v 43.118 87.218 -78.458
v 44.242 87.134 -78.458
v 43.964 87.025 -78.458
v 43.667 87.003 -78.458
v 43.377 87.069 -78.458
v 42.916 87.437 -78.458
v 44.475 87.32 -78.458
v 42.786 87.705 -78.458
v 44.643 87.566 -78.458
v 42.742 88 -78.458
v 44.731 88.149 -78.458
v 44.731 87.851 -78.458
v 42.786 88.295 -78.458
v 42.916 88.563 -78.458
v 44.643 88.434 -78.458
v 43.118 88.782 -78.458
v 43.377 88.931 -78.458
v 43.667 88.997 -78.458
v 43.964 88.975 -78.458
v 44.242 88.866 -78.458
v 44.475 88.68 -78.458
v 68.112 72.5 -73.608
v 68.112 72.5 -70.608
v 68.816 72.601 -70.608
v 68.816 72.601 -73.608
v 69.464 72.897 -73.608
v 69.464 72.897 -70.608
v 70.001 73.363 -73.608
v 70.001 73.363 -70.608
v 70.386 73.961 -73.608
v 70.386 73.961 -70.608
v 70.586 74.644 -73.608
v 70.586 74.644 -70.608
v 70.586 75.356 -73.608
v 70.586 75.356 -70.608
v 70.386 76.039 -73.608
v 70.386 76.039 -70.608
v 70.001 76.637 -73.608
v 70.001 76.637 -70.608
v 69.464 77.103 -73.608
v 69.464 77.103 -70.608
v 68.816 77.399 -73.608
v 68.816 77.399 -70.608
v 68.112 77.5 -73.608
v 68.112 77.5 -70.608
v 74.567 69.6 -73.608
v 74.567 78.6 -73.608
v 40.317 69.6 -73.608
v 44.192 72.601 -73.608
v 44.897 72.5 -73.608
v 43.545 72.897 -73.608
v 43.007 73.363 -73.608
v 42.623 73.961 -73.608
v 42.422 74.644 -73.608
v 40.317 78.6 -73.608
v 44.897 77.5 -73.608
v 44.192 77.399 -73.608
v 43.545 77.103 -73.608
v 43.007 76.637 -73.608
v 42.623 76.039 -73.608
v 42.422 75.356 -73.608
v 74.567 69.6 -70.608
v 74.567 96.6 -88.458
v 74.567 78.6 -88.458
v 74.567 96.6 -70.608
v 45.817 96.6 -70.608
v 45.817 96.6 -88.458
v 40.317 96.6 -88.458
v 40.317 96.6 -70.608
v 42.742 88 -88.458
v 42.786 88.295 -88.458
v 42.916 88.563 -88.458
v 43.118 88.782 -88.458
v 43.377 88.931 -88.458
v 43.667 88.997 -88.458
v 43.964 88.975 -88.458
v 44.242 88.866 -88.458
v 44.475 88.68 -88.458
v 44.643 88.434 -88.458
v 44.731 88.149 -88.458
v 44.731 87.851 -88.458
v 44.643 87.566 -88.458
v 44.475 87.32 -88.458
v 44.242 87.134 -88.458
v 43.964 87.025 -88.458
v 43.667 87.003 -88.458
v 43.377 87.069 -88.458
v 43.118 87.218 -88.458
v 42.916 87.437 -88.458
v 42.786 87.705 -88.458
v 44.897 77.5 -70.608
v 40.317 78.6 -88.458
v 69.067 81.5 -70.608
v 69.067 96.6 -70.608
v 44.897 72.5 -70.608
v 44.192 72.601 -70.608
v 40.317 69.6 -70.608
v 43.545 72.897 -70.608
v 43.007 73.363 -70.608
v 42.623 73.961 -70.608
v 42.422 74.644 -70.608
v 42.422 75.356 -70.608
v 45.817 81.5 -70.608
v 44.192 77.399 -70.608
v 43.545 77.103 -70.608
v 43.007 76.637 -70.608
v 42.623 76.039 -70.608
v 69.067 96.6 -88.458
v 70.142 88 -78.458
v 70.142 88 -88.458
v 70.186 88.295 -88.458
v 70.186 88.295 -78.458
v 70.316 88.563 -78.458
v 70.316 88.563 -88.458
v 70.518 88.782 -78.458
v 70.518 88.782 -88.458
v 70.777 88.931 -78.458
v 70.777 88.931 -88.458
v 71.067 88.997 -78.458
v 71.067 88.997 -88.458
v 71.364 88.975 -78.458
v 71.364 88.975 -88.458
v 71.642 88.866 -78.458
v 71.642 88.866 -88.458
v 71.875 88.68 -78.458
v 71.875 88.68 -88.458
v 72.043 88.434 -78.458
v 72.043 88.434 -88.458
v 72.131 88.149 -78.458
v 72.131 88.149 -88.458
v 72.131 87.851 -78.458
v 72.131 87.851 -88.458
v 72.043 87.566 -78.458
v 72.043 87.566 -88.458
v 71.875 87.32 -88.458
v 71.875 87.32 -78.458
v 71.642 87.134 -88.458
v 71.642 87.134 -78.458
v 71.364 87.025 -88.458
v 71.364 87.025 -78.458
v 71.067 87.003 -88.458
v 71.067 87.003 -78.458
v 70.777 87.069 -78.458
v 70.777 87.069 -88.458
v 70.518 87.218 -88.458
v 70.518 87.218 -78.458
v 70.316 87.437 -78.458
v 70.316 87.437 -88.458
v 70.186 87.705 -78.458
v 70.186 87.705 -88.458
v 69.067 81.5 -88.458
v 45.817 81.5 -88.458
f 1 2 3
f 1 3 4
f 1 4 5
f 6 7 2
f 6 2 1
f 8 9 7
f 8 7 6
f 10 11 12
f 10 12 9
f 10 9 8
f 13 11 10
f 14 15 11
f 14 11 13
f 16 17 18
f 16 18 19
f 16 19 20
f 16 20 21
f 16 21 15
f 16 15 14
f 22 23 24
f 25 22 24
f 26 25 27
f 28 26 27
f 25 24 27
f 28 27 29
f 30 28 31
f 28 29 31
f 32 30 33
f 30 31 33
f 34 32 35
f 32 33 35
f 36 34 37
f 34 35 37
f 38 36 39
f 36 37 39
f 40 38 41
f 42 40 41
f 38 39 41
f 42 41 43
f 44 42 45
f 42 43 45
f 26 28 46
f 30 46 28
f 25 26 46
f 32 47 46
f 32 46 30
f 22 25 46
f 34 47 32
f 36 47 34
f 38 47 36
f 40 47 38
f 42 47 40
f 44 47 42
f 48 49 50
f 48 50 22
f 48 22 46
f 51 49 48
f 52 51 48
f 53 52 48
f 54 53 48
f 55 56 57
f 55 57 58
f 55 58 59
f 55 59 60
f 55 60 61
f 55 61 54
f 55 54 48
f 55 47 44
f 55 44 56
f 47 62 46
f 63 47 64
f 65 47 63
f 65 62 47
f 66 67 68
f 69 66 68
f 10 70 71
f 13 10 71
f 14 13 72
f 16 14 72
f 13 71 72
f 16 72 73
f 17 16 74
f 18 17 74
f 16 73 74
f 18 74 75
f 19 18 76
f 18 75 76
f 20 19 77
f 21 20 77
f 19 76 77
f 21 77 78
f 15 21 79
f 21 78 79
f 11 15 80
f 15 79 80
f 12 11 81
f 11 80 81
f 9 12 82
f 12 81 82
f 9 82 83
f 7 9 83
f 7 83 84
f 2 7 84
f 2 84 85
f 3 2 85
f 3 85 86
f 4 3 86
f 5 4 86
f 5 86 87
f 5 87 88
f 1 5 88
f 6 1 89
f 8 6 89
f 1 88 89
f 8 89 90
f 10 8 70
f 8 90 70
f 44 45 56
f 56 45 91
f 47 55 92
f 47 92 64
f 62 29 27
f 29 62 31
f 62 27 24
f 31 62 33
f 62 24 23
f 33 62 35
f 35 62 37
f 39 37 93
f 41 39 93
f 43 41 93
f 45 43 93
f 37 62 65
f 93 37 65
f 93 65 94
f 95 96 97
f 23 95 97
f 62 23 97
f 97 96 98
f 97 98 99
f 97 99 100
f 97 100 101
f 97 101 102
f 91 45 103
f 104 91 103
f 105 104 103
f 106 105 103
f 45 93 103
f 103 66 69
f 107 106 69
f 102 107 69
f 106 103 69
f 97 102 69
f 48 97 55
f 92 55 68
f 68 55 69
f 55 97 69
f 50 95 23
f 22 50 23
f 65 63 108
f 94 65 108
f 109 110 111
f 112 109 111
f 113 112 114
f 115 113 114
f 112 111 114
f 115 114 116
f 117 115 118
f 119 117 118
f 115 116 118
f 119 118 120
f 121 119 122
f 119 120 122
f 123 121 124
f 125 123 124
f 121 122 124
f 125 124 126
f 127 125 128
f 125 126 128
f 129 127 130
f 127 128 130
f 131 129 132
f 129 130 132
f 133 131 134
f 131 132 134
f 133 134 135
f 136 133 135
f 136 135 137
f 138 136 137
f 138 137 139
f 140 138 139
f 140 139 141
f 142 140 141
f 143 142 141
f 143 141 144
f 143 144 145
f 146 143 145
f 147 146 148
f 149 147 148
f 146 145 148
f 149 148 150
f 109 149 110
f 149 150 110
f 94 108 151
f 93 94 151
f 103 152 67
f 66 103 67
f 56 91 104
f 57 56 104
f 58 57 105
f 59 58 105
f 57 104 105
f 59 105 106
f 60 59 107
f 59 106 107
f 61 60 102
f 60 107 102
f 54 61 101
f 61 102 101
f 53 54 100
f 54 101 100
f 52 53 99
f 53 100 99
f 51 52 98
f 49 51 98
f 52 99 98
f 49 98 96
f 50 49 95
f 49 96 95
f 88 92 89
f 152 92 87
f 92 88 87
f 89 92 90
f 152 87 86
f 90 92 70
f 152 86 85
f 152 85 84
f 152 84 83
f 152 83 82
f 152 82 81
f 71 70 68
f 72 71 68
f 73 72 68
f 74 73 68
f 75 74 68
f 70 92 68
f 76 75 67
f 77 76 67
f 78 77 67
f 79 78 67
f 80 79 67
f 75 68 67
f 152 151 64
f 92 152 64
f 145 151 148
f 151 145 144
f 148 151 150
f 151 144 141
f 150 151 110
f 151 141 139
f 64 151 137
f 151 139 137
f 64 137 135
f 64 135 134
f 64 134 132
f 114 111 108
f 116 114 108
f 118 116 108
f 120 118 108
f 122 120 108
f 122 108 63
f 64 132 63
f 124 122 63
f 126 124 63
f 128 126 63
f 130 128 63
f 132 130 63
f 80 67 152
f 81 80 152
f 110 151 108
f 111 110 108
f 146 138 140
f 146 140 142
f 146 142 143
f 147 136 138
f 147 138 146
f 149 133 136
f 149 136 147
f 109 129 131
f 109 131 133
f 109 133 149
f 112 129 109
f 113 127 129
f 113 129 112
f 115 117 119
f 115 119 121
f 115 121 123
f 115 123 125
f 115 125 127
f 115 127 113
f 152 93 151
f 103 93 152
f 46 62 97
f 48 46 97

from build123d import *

# Parameters (mm, degrees)
BOSS_EXTRUDE1_DEPTH = 17.85
SKETCH5_R           = 1
CUT_EXTRUDE1_DEPTH  = 10
SKETCH6_W           = 34.25
SKETCH6_H           = 9
BOSS_EXTRUDE2_DEPTH = 3


with BuildPart() as part:
    # Sketch4 → Boss-Extrude1 (new body)
    with BuildSketch(Plane(origin=(0, 0, -70.608208955), x_dir=(-1, 0, 0), z_dir=(0, 0, -1))):
        Polygon((-69.066917791, 81.5), (-45.816917791, 81.5), (-45.816917791, 96.6), (-40.316917791, 96.6), (-40.316917791, 78.6), (-74.566917791, 78.6), (-74.566917791, 96.6), (-69.066917791, 96.6), align=None)
    extrude(amount=BOSS_EXTRUDE1_DEPTH)

    # Sketch5 → Cut-Extrude1 (cut)
    with BuildSketch(Plane(origin=(0, 0, -88.458208955), x_dir=(-1, 0, 0), z_dir=(0, 0, -1))):
        with Locations((-43.741917791, 88)):
            Circle(SKETCH5_R)
        with Locations((-71.141917791, 88)):
            Circle(SKETCH5_R)
    extrude(amount=-CUT_EXTRUDE1_DEPTH, mode=Mode.SUBTRACT)

    # Sketch6 → Boss-Extrude2 (add)
    with BuildSketch(Plane(origin=(0, 0, -70.608208955), x_dir=(-1, 0, 0), z_dir=(0, 0, -1))):
        with Locations((-57.441917791, 74.1)):
            Rectangle(SKETCH6_W, SKETCH6_H)
        with BuildLine():
            Line((-68.111940299, 77.5), (-44.896828216, 77.5))
            ThreePointArc((-44.896828216, 77.5), (-42.396828216, 75), (-44.896828216, 72.5))
            Line((-44.896828216, 72.5), (-68.111940299, 72.5))
            ThreePointArc((-68.111940299, 72.5), (-70.611940299, 75), (-68.111940299, 77.5))
        make_face(mode=Mode.SUBTRACT)
    extrude(amount=BOSS_EXTRUDE2_DEPTH)


solid = part.part
